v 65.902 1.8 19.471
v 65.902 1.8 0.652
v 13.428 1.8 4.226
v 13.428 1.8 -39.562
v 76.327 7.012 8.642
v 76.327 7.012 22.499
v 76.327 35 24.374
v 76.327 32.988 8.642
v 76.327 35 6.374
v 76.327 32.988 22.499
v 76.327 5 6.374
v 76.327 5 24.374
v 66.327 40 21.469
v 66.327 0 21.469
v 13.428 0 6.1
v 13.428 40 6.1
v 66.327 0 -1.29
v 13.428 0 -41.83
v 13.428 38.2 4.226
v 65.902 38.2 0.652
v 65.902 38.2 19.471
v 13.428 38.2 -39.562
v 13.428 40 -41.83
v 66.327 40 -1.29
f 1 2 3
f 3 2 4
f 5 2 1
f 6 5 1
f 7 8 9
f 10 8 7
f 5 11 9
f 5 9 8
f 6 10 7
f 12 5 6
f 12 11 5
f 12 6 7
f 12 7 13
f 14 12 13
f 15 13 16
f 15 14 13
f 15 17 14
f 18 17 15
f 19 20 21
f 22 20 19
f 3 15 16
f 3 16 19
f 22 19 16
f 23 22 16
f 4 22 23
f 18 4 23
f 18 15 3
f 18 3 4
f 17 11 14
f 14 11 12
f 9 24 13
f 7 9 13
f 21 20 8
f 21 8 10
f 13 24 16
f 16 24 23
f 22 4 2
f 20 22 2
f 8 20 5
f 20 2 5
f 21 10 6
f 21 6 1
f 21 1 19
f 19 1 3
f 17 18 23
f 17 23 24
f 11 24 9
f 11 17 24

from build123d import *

# Parameters (mm, degrees)
BOSS_EXTRUDE1_DEPTH = 40
CHAMFER1_SIZE       = 5
CHAMFER1_SIZE2      = 10
CHAMFER2_SIZE       = 10
CHAMFER2_SIZE2      = 5
SHELL1_T            = -1.8


with BuildPart() as part:
    # Sketch2 → Boss-Extrude1 (new body)
    with BuildSketch(Plane(origin=(0, 0, 0), x_dir=(1, 0, 0), z_dir=(0, 1, 0))):
        Polygon((13.428152071, -6.099992503), (13.428152071, 41.830007497), (76.327388482, -6.373909949), (76.327388482, -24.373909949), align=None)
    extrude(amount=BOSS_EXTRUDE1_DEPTH)

    # Chamfer1
    chamfer1_edges = [part.edges().sort_by_distance(p)[0] for p in [
        (76.327388482, 40, 15.373909949),
    ]]
    chamfer1_side = [part.faces().sort_by_distance(p)[0] for p in [
        (76.327388482, 20, 15.373909949),
    ]]
    chamfer(chamfer1_edges, length=CHAMFER1_SIZE, length2=CHAMFER1_SIZE2, reference=chamfer1_side[0])

    # Chamfer2
    chamfer2_edges = [part.edges().sort_by_distance(p)[0] for p in [
        (76.327388482, 0, 15.373909949),
    ]]
    chamfer2_side = [part.faces().sort_by_distance(p)[0] for p in [
        (40.118747713, 0, -3.760440323),
    ]]
    chamfer(chamfer2_edges, length=CHAMFER2_SIZE, length2=CHAMFER2_SIZE2, reference=chamfer2_side[0])

    # Shell1
    shell1_openings = [part.faces().sort_by_distance(p)[0] for p in [
        (13.428152071, 20, -17.865007497),
        (76.327388482, 20, 15.373909949),
    ]]
    offset(amount=SHELL1_T, openings=shell1_openings, kind=Kind.INTERSECTION)


solid = part.part
